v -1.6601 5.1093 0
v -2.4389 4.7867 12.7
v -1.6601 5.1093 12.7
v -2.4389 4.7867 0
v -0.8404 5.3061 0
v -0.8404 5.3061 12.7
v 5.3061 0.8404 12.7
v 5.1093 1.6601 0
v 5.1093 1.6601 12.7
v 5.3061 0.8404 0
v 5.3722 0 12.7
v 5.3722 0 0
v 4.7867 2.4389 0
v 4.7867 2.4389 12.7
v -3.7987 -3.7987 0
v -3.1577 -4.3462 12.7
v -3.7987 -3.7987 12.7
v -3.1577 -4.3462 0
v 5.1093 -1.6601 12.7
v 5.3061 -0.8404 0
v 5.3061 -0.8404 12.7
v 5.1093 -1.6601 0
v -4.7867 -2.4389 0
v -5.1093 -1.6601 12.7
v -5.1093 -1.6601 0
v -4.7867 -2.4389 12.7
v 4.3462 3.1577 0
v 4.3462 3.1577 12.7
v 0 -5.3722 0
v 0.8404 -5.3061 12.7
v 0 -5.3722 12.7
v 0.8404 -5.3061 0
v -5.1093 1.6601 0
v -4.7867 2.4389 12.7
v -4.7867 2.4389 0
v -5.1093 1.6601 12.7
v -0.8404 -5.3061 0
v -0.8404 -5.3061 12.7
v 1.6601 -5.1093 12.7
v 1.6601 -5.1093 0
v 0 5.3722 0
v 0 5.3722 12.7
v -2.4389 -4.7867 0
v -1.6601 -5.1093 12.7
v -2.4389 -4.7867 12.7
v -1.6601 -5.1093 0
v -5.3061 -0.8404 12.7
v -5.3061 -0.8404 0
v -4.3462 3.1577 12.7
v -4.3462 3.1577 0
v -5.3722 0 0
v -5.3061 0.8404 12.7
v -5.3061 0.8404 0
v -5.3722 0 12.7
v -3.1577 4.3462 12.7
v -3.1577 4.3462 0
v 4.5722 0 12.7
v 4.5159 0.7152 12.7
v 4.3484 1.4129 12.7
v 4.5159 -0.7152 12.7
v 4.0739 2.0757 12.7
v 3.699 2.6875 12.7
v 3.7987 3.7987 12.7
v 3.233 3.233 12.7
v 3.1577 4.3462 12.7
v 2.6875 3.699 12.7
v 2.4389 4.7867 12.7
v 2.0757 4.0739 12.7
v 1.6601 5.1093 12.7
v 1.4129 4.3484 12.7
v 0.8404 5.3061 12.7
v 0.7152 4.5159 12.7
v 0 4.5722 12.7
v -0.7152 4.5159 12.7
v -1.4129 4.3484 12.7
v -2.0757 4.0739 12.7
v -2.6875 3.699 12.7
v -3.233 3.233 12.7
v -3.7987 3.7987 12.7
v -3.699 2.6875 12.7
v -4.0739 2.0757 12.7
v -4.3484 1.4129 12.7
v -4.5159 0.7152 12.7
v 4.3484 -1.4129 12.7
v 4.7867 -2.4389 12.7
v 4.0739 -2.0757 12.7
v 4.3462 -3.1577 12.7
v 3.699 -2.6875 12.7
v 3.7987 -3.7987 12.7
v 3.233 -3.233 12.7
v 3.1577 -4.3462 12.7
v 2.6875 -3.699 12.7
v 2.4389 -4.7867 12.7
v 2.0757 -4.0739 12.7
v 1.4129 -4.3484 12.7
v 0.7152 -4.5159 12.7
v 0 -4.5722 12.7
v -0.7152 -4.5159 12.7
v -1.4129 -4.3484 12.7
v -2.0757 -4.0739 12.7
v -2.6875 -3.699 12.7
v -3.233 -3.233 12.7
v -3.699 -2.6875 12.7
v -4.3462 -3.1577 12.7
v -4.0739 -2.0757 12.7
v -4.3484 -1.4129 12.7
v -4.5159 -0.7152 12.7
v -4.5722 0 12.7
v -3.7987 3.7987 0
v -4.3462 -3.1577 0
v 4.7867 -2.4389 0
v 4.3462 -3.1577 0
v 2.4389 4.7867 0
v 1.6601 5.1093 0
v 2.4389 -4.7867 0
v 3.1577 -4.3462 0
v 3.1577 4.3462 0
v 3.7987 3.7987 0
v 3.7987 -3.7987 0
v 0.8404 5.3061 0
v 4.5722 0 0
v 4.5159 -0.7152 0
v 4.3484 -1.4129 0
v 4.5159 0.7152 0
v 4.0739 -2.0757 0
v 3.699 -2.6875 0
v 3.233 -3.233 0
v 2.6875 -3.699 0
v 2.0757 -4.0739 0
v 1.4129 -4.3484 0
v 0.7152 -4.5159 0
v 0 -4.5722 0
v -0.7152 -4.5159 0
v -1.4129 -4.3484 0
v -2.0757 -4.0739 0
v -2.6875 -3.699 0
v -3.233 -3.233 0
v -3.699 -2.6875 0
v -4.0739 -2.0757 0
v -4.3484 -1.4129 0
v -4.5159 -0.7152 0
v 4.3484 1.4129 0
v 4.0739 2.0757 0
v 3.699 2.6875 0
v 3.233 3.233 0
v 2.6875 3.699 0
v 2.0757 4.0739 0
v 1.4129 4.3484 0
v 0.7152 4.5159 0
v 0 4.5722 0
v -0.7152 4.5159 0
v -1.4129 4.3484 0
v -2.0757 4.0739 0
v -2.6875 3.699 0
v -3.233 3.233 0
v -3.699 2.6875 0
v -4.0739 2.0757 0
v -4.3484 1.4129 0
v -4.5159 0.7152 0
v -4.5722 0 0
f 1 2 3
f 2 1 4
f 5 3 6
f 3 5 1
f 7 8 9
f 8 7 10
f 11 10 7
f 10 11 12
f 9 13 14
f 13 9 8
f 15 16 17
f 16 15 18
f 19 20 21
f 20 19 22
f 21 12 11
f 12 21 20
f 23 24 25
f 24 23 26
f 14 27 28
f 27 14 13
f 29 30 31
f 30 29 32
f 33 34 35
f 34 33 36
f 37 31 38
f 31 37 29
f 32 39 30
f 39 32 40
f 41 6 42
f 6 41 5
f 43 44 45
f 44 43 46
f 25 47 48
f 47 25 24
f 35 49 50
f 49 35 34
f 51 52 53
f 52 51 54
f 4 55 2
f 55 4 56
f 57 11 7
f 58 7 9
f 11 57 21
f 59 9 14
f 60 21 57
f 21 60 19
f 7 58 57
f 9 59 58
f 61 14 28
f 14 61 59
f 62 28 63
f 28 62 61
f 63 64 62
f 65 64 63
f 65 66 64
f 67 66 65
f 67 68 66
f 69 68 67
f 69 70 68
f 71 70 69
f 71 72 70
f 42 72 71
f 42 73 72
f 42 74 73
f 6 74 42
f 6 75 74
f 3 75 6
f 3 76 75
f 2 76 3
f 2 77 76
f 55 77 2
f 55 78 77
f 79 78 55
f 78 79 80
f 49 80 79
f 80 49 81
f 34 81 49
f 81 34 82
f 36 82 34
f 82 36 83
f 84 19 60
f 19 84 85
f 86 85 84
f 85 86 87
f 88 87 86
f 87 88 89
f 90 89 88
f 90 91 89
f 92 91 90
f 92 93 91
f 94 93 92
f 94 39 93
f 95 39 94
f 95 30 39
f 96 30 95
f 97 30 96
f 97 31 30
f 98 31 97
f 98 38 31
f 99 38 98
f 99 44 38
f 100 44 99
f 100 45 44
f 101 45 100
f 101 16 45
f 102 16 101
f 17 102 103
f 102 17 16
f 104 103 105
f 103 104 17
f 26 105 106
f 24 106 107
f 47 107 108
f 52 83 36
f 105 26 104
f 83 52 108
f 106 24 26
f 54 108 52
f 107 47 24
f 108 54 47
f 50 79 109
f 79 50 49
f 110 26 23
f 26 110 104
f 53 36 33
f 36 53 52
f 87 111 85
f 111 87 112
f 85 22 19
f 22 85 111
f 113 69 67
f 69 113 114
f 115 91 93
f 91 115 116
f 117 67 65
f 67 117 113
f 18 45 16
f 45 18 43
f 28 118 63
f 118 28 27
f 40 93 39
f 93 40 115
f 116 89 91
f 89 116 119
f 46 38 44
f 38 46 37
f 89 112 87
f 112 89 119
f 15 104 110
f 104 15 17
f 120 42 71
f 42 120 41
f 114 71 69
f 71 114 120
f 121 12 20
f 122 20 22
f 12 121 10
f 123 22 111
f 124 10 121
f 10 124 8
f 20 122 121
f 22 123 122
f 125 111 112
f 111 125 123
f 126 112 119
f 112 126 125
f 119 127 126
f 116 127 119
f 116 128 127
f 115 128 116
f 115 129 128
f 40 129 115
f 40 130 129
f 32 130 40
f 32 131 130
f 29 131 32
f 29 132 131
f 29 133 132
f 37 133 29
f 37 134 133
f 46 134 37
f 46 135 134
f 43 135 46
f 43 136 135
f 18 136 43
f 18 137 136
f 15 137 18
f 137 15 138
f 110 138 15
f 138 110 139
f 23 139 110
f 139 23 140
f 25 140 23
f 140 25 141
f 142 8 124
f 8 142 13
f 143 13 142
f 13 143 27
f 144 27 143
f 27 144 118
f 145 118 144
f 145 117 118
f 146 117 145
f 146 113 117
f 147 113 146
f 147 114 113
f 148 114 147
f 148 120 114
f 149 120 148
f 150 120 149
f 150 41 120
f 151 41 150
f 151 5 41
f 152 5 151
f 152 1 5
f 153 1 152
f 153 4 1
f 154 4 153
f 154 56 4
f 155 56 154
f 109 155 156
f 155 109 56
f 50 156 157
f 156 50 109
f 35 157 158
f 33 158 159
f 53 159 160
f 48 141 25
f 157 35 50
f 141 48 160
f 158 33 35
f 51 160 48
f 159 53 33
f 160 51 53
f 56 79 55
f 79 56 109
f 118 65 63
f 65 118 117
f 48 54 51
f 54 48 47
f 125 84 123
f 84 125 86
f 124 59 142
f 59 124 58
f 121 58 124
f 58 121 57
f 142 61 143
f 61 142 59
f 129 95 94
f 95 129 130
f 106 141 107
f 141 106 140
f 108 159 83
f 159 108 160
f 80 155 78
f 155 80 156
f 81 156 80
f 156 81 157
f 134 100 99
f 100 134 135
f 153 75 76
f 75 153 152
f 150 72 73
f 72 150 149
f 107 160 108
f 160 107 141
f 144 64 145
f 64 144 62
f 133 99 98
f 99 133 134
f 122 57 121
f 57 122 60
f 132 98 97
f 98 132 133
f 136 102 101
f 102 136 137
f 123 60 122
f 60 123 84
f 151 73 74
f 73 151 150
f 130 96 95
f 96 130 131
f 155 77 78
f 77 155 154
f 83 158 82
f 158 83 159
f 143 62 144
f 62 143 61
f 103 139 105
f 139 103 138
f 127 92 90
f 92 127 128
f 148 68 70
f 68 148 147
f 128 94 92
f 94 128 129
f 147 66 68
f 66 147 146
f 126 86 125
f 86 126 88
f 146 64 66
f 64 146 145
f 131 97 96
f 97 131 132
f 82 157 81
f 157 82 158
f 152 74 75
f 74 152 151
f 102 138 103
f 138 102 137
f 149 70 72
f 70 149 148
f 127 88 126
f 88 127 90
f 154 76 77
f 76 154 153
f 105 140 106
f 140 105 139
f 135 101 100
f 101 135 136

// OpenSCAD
inch=25.4;
kerf=0.0035*inch*2;
gold=1.61803398875;

fineness_stl=200;
fineness_low=40;

build_stl=false;

fineness=build_stl?fineness_stl:fineness_low;

module ringa(){
    difference(){
        
        cylinder(1/2*inch,1/4*inch,1/4*inch,$fn=fineness);
        translate([0,0,-0.001])
        cylinder(1/2*inch+0.002,1/4*inch-0.8,1/4*inch-0.8,$fn=fineness);
        
    }
}

module ringb(){
    difference(){
        cylinder(1/2*inch,1/4*inch-0.8-kerf,1/4*inch-0.8-kerf,$fn=fineness);
    translate([0,0,-0.001])
        cylinder(1/2*inch+0.002,1/4*inch-1.6-kerf,1/4*inch-1.6-kerf,$fn=fineness);
    }
}

//ringa();
ringb();
